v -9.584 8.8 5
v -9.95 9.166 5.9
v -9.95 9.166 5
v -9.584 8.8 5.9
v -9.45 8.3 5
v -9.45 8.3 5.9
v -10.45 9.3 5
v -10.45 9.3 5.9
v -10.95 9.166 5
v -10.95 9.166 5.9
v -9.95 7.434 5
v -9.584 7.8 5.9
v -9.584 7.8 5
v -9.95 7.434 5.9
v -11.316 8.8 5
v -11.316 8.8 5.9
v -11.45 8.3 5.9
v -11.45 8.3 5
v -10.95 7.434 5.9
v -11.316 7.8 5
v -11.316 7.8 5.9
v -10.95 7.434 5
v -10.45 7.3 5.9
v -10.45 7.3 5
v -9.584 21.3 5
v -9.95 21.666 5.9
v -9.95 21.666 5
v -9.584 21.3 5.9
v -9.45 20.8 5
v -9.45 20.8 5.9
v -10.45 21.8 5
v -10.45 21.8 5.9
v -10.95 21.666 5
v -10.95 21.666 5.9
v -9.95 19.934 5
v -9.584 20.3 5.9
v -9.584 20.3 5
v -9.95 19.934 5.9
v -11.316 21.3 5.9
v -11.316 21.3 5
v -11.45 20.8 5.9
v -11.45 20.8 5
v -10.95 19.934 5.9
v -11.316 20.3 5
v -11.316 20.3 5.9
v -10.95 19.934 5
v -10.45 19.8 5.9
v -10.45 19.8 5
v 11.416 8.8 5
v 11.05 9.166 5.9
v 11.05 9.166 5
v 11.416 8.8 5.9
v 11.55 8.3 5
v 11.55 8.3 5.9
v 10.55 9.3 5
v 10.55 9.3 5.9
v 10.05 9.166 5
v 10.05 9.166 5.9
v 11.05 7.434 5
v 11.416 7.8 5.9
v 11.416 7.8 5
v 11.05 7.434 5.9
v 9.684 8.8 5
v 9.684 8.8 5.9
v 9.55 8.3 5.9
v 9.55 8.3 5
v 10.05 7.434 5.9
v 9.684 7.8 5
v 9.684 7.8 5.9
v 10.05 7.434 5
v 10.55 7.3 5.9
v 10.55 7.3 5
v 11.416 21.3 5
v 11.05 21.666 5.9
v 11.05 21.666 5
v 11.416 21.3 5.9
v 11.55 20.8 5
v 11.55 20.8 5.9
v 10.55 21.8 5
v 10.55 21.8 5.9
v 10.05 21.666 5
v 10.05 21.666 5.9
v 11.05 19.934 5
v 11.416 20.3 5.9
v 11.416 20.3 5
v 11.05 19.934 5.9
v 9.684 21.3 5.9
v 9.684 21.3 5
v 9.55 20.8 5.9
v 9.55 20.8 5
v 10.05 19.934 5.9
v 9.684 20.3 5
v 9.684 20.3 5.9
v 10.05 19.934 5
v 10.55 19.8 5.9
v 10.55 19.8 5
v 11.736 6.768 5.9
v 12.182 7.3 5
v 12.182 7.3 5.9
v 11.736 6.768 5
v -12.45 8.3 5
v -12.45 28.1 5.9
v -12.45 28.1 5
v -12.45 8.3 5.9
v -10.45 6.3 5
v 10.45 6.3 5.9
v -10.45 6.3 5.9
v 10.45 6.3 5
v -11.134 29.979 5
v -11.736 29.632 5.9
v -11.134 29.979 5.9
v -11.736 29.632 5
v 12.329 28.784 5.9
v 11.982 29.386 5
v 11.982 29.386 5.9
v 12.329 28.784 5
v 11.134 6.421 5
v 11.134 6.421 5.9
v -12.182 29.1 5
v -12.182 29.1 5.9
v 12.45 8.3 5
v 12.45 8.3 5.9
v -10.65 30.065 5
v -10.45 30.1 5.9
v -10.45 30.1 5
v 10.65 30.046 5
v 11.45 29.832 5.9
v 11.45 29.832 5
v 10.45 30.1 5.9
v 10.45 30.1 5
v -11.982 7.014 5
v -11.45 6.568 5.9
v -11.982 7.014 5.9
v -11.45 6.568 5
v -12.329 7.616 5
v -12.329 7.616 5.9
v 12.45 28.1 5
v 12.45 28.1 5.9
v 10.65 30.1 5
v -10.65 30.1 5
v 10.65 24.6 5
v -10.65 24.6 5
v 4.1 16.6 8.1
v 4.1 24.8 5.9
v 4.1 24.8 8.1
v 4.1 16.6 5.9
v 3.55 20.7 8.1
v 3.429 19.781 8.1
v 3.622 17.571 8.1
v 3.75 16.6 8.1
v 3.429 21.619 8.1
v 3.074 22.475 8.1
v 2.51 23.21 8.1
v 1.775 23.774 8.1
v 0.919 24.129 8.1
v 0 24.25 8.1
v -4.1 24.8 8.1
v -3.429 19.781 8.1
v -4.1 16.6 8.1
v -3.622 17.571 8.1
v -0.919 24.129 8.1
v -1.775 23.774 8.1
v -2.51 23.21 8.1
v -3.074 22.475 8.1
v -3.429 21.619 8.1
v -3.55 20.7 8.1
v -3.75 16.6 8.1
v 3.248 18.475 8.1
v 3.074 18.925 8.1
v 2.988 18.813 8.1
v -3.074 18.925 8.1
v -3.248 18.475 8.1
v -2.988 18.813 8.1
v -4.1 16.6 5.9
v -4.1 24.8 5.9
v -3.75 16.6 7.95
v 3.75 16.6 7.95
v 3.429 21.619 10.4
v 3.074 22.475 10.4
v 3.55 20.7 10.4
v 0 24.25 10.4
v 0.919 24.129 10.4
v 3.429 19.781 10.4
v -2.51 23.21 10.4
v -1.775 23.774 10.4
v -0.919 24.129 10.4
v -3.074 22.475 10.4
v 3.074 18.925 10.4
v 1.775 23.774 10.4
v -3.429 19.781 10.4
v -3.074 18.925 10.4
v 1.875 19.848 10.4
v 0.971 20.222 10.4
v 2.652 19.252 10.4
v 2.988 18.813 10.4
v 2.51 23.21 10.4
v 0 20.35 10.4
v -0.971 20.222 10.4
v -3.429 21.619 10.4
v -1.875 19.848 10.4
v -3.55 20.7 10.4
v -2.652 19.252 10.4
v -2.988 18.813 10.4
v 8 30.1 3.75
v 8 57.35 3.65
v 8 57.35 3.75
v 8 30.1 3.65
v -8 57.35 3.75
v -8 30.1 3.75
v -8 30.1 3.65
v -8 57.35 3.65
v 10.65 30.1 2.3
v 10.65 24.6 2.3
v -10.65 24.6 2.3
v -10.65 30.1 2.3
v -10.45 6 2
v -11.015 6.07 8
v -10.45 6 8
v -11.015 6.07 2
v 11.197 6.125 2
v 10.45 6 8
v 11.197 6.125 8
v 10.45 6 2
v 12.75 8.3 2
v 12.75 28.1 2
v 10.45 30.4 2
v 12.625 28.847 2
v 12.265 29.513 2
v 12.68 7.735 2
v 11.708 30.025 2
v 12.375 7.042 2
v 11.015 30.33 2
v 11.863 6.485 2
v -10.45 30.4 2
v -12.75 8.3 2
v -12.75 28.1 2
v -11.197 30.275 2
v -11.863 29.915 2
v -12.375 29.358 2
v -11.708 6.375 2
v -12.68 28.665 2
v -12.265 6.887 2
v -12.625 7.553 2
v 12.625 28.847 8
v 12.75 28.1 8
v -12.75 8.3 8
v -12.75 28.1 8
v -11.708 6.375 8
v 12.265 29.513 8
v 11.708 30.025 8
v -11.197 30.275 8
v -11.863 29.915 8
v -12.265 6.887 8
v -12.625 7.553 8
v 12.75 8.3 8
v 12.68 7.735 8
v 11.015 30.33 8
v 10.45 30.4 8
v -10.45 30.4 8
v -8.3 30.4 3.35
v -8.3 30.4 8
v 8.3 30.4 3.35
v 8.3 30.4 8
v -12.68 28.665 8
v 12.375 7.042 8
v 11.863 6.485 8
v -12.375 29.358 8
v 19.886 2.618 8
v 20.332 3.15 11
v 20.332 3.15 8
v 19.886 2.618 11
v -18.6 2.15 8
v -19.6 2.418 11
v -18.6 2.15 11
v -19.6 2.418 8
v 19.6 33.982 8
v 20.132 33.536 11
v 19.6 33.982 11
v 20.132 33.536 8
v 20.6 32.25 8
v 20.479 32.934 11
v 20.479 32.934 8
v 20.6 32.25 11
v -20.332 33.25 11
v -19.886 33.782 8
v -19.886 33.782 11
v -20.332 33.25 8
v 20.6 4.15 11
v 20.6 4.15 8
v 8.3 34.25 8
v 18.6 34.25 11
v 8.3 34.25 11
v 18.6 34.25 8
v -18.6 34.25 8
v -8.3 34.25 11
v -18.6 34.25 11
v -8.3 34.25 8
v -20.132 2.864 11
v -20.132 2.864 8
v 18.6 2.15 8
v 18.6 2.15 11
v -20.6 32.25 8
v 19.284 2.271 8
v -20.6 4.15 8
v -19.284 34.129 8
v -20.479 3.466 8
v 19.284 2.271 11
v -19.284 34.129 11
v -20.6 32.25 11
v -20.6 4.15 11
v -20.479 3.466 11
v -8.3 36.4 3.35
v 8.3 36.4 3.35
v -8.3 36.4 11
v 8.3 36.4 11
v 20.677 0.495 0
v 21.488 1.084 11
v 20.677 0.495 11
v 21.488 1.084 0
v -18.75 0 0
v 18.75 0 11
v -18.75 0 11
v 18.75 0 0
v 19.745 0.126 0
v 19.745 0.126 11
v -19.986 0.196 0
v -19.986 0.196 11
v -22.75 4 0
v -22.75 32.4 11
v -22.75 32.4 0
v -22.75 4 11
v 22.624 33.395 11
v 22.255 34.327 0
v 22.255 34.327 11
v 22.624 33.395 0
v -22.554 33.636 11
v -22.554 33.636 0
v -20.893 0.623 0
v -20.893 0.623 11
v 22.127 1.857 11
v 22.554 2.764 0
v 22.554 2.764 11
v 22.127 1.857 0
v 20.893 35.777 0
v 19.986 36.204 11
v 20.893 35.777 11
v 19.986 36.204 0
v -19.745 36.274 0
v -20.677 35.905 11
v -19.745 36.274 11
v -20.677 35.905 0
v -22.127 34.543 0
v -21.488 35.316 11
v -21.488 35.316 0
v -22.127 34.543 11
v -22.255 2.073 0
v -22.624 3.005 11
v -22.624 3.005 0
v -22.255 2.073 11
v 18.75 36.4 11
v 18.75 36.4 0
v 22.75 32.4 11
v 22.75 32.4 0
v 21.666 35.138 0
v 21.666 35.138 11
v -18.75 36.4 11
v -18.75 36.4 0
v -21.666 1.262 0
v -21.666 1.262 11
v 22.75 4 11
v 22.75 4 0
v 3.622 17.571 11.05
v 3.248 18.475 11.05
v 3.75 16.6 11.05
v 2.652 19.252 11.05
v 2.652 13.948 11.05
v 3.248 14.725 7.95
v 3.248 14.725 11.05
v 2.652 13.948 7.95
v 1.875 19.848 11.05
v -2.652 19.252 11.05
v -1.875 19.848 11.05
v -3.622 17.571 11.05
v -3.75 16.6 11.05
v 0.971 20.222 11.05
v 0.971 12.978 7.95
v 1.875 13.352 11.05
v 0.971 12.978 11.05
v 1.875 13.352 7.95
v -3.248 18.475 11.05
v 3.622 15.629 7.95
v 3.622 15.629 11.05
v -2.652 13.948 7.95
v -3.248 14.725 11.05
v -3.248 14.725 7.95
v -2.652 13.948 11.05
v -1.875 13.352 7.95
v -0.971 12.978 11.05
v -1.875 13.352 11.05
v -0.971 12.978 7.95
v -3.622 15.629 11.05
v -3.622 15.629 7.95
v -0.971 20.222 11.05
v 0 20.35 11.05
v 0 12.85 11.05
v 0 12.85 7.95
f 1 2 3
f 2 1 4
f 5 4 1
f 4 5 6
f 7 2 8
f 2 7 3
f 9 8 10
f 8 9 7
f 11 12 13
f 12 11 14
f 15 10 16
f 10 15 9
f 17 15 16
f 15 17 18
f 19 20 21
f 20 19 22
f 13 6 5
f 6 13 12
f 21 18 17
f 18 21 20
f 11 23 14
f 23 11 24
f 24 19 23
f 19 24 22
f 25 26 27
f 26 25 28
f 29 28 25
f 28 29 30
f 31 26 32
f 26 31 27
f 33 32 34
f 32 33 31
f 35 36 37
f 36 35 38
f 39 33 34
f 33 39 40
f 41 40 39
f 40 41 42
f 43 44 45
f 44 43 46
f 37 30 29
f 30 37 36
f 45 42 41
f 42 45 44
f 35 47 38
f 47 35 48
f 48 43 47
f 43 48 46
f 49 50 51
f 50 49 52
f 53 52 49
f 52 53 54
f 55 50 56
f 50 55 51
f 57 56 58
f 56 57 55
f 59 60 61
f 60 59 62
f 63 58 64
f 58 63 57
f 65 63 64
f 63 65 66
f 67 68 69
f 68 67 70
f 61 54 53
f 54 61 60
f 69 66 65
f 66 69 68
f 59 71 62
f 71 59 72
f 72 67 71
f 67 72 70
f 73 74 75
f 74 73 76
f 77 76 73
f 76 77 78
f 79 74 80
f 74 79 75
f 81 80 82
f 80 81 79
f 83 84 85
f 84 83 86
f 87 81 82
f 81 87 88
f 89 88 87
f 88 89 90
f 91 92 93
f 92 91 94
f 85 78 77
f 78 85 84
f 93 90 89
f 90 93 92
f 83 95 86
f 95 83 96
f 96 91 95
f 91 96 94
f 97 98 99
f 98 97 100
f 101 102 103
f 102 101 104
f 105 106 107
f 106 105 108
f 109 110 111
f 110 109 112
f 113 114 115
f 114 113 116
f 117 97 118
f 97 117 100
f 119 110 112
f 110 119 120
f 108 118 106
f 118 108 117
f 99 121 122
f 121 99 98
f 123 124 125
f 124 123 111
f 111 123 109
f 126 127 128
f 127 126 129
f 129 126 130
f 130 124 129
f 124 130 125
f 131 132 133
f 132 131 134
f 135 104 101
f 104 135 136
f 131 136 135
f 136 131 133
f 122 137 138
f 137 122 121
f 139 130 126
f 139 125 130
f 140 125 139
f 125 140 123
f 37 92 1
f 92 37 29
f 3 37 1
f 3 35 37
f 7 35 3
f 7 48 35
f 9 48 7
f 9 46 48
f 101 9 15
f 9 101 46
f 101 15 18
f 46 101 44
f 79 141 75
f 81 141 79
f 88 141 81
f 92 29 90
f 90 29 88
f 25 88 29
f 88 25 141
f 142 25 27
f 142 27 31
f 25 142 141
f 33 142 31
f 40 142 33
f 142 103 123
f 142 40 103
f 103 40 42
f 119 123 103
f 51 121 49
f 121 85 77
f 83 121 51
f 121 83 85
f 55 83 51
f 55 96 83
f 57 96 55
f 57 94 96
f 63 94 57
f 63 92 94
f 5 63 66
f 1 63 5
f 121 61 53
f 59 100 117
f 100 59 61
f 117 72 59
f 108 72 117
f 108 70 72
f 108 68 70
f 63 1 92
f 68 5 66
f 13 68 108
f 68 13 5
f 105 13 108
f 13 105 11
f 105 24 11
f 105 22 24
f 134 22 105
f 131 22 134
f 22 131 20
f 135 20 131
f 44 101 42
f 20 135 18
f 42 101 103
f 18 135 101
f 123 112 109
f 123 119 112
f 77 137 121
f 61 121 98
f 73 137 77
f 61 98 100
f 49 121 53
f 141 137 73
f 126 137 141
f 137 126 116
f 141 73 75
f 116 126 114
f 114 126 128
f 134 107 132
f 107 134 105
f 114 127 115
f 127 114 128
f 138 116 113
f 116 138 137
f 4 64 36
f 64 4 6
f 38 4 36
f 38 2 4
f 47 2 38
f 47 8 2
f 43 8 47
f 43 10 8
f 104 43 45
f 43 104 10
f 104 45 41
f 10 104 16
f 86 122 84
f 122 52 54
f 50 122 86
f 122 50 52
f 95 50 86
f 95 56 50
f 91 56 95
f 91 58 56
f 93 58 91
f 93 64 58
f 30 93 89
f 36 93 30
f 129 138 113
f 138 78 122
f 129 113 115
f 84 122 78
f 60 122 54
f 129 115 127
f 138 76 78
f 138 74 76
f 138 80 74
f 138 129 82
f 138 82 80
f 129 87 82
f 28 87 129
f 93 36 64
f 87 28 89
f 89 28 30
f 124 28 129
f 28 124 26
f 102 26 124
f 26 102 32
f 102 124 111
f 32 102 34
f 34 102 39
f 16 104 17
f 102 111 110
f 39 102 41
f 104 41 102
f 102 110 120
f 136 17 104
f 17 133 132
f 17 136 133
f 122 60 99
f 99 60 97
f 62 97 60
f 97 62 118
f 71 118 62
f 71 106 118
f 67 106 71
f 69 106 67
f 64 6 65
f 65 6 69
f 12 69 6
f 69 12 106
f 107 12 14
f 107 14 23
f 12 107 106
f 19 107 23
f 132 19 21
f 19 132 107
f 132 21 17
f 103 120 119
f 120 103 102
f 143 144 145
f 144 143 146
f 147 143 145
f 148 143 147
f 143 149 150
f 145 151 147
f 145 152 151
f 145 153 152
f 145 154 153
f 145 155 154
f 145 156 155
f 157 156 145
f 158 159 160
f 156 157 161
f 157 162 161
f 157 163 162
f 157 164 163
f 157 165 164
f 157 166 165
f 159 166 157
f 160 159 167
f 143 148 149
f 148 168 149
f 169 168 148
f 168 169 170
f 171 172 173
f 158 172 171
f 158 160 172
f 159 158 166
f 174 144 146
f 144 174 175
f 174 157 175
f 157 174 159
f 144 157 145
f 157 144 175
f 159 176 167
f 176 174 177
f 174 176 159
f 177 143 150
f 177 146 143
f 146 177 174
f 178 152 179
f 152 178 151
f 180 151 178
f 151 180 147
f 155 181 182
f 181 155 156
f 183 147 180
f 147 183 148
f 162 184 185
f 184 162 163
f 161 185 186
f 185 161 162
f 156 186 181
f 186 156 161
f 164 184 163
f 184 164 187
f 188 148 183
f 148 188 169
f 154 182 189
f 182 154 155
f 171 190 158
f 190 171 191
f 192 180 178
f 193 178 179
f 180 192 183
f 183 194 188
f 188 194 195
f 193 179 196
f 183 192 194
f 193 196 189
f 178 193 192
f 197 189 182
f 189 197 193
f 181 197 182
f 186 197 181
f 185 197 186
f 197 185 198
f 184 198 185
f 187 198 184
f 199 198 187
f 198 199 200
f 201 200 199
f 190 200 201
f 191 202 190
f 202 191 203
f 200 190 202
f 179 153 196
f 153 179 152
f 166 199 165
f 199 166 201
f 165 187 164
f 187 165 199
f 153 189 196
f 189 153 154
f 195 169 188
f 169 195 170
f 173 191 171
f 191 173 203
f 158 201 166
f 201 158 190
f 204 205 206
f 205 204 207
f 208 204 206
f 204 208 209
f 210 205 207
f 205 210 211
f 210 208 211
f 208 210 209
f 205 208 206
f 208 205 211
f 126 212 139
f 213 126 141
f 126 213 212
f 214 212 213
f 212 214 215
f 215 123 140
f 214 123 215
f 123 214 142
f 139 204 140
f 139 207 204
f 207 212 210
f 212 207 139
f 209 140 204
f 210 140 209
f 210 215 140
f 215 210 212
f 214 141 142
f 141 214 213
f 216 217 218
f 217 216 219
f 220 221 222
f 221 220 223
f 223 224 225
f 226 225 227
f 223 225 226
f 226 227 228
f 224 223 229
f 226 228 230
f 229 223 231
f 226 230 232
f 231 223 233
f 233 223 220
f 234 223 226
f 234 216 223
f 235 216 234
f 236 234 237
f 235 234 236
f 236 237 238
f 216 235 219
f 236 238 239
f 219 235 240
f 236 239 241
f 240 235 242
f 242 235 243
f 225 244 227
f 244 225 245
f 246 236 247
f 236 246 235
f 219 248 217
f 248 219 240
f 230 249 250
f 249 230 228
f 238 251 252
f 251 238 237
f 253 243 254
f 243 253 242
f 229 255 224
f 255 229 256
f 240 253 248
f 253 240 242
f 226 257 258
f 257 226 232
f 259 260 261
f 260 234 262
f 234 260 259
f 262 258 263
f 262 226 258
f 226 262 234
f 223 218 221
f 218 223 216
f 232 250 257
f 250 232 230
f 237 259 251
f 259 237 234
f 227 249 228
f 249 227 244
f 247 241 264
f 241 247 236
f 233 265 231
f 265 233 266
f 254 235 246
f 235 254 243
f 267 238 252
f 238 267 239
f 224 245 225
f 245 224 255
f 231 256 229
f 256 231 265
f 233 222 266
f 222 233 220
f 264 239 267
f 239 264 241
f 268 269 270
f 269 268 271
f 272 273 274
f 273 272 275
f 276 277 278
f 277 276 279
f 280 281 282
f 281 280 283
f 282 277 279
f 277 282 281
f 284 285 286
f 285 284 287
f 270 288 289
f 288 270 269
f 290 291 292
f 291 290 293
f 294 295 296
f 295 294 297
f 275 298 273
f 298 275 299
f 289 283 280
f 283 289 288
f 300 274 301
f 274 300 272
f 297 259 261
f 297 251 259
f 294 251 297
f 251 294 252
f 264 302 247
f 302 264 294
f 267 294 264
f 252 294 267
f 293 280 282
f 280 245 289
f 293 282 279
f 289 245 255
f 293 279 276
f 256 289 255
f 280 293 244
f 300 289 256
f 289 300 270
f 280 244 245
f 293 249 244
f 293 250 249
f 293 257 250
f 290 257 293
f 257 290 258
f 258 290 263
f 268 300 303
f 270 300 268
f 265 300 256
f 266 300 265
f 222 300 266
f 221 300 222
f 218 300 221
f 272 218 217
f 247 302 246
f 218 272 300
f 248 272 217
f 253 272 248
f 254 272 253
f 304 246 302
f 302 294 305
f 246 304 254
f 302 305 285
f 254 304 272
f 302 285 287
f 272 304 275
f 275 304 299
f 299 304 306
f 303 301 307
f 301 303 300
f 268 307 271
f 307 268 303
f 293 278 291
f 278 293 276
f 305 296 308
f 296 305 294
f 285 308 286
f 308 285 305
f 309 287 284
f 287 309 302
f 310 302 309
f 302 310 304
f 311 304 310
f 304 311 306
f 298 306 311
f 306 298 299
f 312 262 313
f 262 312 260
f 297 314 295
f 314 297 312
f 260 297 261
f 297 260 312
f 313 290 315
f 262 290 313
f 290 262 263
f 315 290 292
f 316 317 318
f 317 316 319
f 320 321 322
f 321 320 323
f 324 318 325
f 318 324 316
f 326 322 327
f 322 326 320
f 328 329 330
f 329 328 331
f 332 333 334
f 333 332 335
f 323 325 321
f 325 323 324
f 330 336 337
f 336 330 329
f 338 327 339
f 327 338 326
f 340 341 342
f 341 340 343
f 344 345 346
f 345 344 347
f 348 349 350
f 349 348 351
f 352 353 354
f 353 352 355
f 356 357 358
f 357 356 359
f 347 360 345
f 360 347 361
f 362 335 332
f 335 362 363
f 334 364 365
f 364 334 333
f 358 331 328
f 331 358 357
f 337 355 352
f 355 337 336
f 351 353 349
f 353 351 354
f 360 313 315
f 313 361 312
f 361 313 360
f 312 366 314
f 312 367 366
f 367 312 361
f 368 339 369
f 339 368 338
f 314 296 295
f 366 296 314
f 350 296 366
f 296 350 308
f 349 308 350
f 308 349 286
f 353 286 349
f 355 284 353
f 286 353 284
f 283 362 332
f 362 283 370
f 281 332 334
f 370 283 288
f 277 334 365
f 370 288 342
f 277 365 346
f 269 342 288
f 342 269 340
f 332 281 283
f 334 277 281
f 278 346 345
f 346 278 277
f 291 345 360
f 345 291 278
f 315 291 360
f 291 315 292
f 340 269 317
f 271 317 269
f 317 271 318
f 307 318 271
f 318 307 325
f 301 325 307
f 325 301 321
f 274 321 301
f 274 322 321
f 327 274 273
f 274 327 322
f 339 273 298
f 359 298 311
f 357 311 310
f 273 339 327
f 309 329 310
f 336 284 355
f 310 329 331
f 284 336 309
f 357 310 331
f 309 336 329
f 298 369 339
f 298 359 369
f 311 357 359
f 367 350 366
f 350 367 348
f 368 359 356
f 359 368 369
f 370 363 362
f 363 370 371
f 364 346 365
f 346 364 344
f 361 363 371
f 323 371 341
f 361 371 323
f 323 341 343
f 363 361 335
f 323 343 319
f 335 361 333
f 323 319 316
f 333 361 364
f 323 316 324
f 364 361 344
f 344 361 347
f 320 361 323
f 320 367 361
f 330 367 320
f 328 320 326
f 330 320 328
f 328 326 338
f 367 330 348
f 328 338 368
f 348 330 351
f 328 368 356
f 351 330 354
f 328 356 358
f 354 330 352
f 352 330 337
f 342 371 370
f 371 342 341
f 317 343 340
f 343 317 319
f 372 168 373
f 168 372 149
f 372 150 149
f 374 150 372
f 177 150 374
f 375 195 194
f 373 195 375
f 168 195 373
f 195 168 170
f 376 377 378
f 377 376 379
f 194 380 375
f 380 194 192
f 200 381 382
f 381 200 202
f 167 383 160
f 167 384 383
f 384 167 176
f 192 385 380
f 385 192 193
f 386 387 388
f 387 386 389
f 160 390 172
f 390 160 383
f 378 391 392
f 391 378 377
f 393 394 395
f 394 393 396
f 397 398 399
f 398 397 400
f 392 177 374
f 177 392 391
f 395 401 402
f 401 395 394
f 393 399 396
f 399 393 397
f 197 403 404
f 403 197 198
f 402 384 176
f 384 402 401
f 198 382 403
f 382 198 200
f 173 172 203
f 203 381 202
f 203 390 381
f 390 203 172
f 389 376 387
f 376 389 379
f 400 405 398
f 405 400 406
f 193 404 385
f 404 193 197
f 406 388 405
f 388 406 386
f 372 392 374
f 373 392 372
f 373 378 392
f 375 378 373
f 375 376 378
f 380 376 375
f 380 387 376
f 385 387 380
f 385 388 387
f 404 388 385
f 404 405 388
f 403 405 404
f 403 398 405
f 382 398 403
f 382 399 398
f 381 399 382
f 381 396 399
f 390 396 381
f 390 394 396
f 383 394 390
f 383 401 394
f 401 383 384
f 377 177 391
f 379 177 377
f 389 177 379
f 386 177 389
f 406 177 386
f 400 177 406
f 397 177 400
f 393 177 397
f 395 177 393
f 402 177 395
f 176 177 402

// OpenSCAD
//------------------------------------------------------------------
/*

Housing for RPi Camera Module V2.1

*/
//------------------------------------------------------------------

// camera board
camera_board_x = 24.9;
camera_board_y = 23.8;
camera_board_z = 0.9;
camera_hole_diameter = 2;
camera_hole_to_edge = 2;
camera_hole_x = 21;
camera_hole_y = 12.5;

// camera body
camera_body_x = 8.2;
camera_body_y = 8.2;
camera_body_y_ofs = 10.3;
camera_body_z0 = 2.2;
camera_body_z1 = 4.5;
camera_body_diameter = 7.1;

// camera cable
camera_cable_x = 16;
camera_cable_y = 30;
camera_cable_z = 0.1;

// camera connector
camera_connector_x = 21.3;
camera_connector_y = 5.5;
camera_connector_z = 2.7;

// camera housing
housing_board_clearance = 0.3;
housing_lid_clearance = 0.3;
housing_cable_clearance = 0.3;
housing_wall_t0 = 6; // thick wall in board cavity
housing_wall_t1 = 2; // thin wall in lid cavity
housing_sides = 10;
housing_rounding = 4;
housing_x = camera_board_x + 2 * (housing_board_clearance + housing_sides);
housing_y = camera_board_y + 2 * (housing_board_clearance + housing_wall_t0);
housing_z = 11;
housing_post_z = max(camera_connector_z, 3);
housing_base_z = 2;

// camera lid
lid_x = housing_x - 2 * (housing_lid_clearance + housing_wall_t1);
lid_y = housing_y - 2 * (housing_lid_clearance + housing_wall_t1);
lid_z = 3;
lid_camera_clearance = 0.2;

//------------------------------------------------------------------
// utility functions

// scaling
pla_shrink = 1/0.999; //~0.1%
abs_shrink = 1/0.995; //~0.5%

// small tweak to avoid differencing artifacts
epsilon = 0.05;

// control the number of facets on cylinders
facet_epsilon = 0.03;
function facets(r) = 180 / acos(1 - (facet_epsilon / r));

// rounded/filleted edges
module inverse() {
  difference() {
    square(1e5, center=true);
    children(0);
  }
}
module rounded(r=1) {
  offset(r=r, $fn=facets(r)) offset(r=-r, $fn=facets(r)) children(0);
}
module filleted(r=1) {
  offset(r=-r, $fn=facets(r)) render() offset(r=r, $fn=facets(r)) children(0);
}

//------------------------------------------------------------------
// camera board

module camera_pcb_holes() {
  h = camera_board_z + (2 * epsilon);
  r = camera_hole_diameter/2;

  basex = camera_hole_to_edge;
  basey = camera_hole_to_edge;
  dx = camera_hole_x;
  dy = camera_hole_y;

  posn = [[0,0], [0,1], [1,0], [1,1]];
  for (x = posn) {
    translate([basex + x[0] * dx, basey + x[1] * dy, -epsilon])
      cylinder(h=h, r=r, $fn=facets(r));
  }
}

module camera_pcb() {
  difference() {
    linear_extrude(height=camera_board_z)
      rounded(r=camera_hole_to_edge)
      square(size=[camera_board_x, camera_board_y]);
    camera_pcb_holes();
  }
}

module camera_body() {
  dx = (camera_board_x - camera_body_x)/2;
  translate([dx,camera_body_y_ofs,camera_board_z]) {
    r = camera_body_diameter/2;
    dx = camera_body_x/2;
    dy = camera_body_y/2;
    cube(size=[camera_body_x,camera_body_y,camera_body_z0]);
    translate([dx,dy,0]) cylinder(h=camera_body_z1, r=r, $fn=facets(r));
  }
}

module camera_cable() {
  x_ofs = (camera_board_x - camera_cable_x)/2;
  y_ofs = camera_board_y - (camera_connector_y/2);
  z_ofs = -camera_connector_z / 2;
  translate([x_ofs,y_ofs,z_ofs])
    cube(size=[camera_cable_x,camera_cable_y,camera_cable_z]);
}

module camera_connector() {
  x_ofs = (camera_board_x - camera_connector_x)/2;
  y_ofs = camera_board_y - camera_connector_y;
  z_ofs = -camera_connector_z;
  translate([x_ofs,y_ofs,z_ofs])
    cube(size=[camera_connector_x,camera_connector_y,camera_connector_z]);
}

module camera_board() {
  x_ofs = -camera_board_x/2;
  y_ofs = housing_board_clearance + housing_wall_t0;
  z_ofs = housing_base_z + housing_post_z;
  translate([x_ofs,y_ofs,z_ofs]) {
    color("DarkGreen") camera_pcb();
    color("DimGray") camera_body();
    color("LightBlue") camera_cable();
    color("SaddleBrown") camera_connector();
  }
}

//------------------------------------------------------------------

module housing_external_2d() {
  rounded(r=housing_rounding)
    square(size=[housing_x, housing_y]);
}

module housing_cavity_2d() {
  x = camera_board_x + (2 * housing_board_clearance);
  y = camera_board_y + (2 * housing_board_clearance);
  x_ofs = (housing_x - x) / 2;
  y_ofs = (housing_y - y) / 2;
  r = camera_hole_to_edge + housing_board_clearance;
  translate([x_ofs,y_ofs])
    rounded(r=r)
    square(size=[x, y]);
}

module housing_external() {
  linear_extrude(height=housing_z) housing_external_2d();
}

module housing_cavity() {
  h = housing_z - housing_base_z + epsilon;
  translate([0,0,housing_base_z]) linear_extrude(height=h) housing_cavity_2d();
}

module lid_cavity() {
  h = lid_z + epsilon;
  z_ofs = housing_z - lid_z;
  translate([0,0,z_ofs]) linear_extrude(height=h) {
    x = lid_x + housing_lid_clearance;
    y = lid_y + housing_lid_clearance;
    x_ofs = (housing_x - x) / 2;
    y_ofs = (housing_y - y) / 2;    
    r = housing_rounding - housing_wall_t1;
    translate([x_ofs,y_ofs])
      rounded(r=r)
      square(size=[x,y]);
  }
}

module cable_cavity() {
  x = camera_cable_x + (2 * housing_cable_clearance);
  y = ((housing_y - camera_board_y)/2) - housing_board_clearance + (2 * epsilon);
  x_ofs = (housing_x - x) / 2;
  y_ofs = housing_y - y + epsilon;
  z_ofs = housing_base_z + housing_post_z - (camera_connector_z / 2) - housing_cable_clearance;
  translate([x_ofs,y_ofs,z_ofs]) linear_extrude(height=housing_z) {
     square(size=[x,y]);
  }
}

module housing() {
  x_ofs = -housing_x / 2;
  translate([x_ofs, 0, 0]) {
    difference() {
      housing_external();
      union() {
        housing_cavity();
        lid_cavity();
        cable_cavity();
      }
    }
  }
}

//------------------------------------------------------------------

module lid_top() {
  x = lid_x;
  y = lid_y;
  x_ofs = x / 2;
  y_ofs = (housing_y - y) / 2;
  z_ofs = housing_z - lid_z;
  r = housing_rounding - housing_wall_t1 - housing_lid_clearance;
  translate([-x_ofs,y_ofs,z_ofs]) linear_extrude(height=lid_z) {
    rounded(r=r)
     square(size=[x,y]);
  }
}

module lid_camera_hole() {
  h = lid_z + (2 * epsilon); 
  r = (camera_body_diameter / 2) + lid_camera_clearance;
  y_ofs = housing_wall_t0 + housing_board_clearance + camera_body_y_ofs;
  z_ofs = housing_z - lid_z - epsilon;
  translate([0,y_ofs,z_ofs])
    cylinder(h=h, r=r, $fn=facets(r));
}

module lid() {
  difference() {    
    *lid_top();
    lid_camera_hole();
  }
}

//------------------------------------------------------------------

camera_board();
housing();
lid();

//------------------------------------------------------------------
